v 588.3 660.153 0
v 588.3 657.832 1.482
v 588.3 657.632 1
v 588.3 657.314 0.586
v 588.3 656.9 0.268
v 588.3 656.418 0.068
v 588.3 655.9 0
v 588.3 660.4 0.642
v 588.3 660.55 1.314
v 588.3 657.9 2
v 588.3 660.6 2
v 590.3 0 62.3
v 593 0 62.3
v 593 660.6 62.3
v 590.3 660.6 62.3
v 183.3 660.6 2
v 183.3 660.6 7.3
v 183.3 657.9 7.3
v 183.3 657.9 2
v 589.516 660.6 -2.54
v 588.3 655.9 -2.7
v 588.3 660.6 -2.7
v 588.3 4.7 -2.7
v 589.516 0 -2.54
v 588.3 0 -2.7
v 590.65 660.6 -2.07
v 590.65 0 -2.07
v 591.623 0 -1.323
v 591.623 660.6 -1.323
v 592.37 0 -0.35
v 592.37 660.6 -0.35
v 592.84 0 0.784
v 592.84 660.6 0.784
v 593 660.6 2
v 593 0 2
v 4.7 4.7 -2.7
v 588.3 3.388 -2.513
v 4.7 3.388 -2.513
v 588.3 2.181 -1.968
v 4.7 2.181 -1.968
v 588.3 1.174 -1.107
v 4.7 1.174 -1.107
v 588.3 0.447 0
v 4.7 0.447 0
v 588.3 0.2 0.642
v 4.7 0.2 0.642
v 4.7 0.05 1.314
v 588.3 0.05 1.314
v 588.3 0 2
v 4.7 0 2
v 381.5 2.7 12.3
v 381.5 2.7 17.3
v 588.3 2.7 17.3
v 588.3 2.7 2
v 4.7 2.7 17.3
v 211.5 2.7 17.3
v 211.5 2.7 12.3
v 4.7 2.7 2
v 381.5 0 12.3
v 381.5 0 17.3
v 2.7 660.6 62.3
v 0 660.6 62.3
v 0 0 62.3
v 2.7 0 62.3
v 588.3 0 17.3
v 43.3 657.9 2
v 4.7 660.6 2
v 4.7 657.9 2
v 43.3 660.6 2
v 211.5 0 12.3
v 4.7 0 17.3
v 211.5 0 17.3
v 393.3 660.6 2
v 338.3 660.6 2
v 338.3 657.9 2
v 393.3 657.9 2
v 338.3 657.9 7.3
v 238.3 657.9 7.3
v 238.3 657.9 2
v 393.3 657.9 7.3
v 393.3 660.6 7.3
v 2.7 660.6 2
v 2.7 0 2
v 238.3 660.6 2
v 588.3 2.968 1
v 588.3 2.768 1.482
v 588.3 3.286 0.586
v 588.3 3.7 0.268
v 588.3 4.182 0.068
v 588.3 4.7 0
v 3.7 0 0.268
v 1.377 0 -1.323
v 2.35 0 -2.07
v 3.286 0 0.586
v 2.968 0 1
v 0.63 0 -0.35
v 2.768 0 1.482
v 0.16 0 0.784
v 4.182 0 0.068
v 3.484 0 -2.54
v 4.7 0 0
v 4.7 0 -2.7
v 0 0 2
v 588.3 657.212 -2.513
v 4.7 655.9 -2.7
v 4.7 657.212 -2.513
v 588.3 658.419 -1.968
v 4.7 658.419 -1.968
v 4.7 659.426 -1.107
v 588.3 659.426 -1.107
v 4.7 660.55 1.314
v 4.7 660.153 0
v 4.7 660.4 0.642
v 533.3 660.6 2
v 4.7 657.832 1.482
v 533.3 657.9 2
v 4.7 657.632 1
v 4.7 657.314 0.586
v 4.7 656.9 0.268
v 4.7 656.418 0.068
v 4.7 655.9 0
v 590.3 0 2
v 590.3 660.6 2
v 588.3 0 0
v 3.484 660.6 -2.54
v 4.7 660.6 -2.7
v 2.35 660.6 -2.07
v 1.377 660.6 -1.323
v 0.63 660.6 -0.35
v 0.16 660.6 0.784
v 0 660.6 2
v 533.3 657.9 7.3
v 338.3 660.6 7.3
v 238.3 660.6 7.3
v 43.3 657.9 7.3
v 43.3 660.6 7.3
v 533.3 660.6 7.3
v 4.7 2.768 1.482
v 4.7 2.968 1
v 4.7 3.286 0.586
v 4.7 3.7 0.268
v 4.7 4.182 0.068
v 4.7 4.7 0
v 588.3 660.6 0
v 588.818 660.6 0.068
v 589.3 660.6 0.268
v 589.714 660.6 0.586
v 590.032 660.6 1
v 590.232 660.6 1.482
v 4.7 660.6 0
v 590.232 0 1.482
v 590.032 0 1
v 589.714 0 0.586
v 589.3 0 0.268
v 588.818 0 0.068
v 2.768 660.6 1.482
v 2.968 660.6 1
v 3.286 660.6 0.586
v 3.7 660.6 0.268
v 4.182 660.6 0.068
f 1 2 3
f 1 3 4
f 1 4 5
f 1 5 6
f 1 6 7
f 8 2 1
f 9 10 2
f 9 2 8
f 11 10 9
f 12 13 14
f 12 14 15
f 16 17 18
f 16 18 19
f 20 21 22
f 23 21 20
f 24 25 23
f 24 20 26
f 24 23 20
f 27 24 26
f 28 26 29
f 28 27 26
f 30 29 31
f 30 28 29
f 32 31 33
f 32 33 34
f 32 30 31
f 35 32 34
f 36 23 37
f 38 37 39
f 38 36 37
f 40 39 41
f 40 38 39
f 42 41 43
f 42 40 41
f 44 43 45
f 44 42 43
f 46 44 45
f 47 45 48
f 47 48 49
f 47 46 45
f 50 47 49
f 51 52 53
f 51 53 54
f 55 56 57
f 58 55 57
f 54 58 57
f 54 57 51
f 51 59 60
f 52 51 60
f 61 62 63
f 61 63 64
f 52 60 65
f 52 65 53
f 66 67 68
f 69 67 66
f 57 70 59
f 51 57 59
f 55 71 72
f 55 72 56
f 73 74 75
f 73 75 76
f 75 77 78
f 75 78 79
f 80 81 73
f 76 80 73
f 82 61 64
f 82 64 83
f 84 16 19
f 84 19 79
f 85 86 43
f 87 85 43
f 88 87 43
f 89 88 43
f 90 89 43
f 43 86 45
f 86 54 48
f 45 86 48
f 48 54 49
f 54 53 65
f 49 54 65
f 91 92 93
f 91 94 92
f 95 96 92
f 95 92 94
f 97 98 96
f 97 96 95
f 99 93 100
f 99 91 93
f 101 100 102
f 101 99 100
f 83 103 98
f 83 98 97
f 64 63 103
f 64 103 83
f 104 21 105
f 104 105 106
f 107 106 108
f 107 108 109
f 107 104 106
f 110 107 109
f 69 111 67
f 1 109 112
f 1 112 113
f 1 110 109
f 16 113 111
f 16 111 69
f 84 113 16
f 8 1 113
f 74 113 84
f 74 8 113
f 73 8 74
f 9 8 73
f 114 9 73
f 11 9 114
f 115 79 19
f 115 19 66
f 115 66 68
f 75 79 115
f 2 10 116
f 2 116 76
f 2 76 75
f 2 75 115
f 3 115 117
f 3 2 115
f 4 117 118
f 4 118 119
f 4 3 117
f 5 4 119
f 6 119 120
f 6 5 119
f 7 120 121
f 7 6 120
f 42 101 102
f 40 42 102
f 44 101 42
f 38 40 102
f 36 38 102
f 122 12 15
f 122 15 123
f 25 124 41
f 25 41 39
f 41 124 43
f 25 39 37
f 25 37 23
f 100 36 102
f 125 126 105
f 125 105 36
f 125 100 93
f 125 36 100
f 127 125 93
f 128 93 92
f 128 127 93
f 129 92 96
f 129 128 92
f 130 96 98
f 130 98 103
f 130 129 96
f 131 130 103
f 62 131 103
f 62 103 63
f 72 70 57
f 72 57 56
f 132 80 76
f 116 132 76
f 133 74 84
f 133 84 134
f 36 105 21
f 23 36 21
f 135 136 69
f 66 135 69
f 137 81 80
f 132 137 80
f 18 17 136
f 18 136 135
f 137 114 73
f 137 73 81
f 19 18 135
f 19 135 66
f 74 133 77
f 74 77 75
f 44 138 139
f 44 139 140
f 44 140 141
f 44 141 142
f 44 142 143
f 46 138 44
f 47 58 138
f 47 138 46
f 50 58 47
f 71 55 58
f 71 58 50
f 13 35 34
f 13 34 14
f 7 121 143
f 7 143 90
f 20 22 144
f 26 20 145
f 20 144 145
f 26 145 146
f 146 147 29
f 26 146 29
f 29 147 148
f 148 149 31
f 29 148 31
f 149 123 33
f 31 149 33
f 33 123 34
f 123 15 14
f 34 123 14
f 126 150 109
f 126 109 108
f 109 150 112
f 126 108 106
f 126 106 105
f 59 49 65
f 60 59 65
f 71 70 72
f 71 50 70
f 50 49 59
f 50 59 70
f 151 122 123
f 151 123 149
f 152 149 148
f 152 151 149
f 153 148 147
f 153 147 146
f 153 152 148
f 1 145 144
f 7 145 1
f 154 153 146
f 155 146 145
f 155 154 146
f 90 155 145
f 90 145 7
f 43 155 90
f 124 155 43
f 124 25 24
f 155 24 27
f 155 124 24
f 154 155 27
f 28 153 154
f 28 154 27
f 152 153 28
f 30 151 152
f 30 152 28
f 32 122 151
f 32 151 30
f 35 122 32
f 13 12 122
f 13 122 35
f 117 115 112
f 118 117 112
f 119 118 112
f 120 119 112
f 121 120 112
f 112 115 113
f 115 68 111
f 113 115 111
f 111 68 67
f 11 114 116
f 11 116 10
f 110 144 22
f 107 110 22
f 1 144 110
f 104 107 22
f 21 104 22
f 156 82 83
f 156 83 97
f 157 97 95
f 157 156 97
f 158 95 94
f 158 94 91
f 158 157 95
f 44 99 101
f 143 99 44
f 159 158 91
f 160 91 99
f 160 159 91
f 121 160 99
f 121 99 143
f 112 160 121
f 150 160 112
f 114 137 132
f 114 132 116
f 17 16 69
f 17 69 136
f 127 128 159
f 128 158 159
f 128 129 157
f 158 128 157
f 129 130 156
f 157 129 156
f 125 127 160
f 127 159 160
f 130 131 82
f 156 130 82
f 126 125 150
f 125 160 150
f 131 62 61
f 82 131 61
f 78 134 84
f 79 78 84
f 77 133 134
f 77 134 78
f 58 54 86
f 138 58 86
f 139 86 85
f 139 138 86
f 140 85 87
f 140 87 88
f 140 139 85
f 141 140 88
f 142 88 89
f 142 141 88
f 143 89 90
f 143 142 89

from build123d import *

# Parameters (mm, degrees)
SKETCH1_W                      = 593
SKETCH1_H                      = 660.6
BASE_FLANGE1_DEPTH             = 2.7
EDGE_FLANGE1_STRIP_W           = 14.8
EDGE_FLANGE1_STRIP_H           = 2.7
EDGE_FLANGE1_STRIP_CUT_DEPTH   = 660.6
EDGE_FLANGE1_STRIP_2_W         = 14.8
EDGE_FLANGE1_STRIP_2_H         = 2.7
EDGE_FLANGE1_STRIP_CUT_2_DEPTH = 660.6
EDGE_FLANGE1_DEPTH             = 660.6
EDGE_FLANGE1_BEND_DEPTH        = 660.6
EDGE_FLANGE2_STRIP_W           = 14.8
EDGE_FLANGE2_STRIP_H           = 2.7
EDGE_FLANGE2_STRIP_CUT_DEPTH   = 583.6
EDGE_FLANGE2_DEPTH             = 583.6
CUT_EXTRUDE2_REACH             = 891.9
SKETCH15_W                     = 38.6
SKETCH15_H                     = 5.3
SKETCH15_W_2                   = 55
EDGE_FLANGE3_STRIP_W           = 14.8
EDGE_FLANGE3_STRIP_H           = 2.7
EDGE_FLANGE3_STRIP_CUT_DEPTH   = 583.6
EDGE_FLANGE3_DEPTH             = 583.6
CUT_EXTRUDE3_REACH             = 891.9
SKETCH23_W                     = 170
SKETCH23_H                     = 5


# Sheet-metal steps are written as plain solids
with BuildPart() as part:
    # Sketch1 → Base-Flange1 (new body)
    with BuildSketch(Plane.XY):
        with Locations((296.5, 330.3)):
            Rectangle(SKETCH1_W, SKETCH1_H)
    extrude(amount=-BASE_FLANGE1_DEPTH)

    # Edge-Flange1 strip (across the edge) → Edge-Flange1 strip cut (cut)
    with BuildSketch(Plane.XZ.offset(-660.6)):
        with Locations((-2.7, -1.35)):
            Rectangle(EDGE_FLANGE1_STRIP_W, EDGE_FLANGE1_STRIP_H)
    extrude(amount=EDGE_FLANGE1_STRIP_CUT_DEPTH, mode=Mode.SUBTRACT)

    # Edge-Flange1 strip 2 (across the edge) → Edge-Flange1 strip cut 2 (cut)
    with BuildSketch(Plane(origin=(593, 0, 0), x_dir=(-1, 0, 0), z_dir=(0, 1, 0))):
        with Locations((-2.7, -1.35)):
            Rectangle(EDGE_FLANGE1_STRIP_2_W, EDGE_FLANGE1_STRIP_2_H)
    extrude(amount=EDGE_FLANGE1_STRIP_CUT_2_DEPTH, mode=Mode.SUBTRACT)

    # Edge-Flange1 section (across the edge) → Edge-Flange1 (add)
    with BuildSketch(Plane.XZ.offset(-660.6)):
        with BuildLine():
            Line((0, 2), (0, 62.3))
            Line((0, 62.3), (2.7, 62.3))
            Line((2.7, 62.3), (2.7, 2))
            ThreePointArc((2.7, 2), (3.285786438, 0.585786438), (4.7, 0))
            Line((4.7, 0), (4.7, -2.7))
            ThreePointArc((4.7, -2.7), (1.376598128, -1.323401872), (0, 2))
        make_face()
    extrude(amount=EDGE_FLANGE1_DEPTH)

    # Edge-Flange1 section 2 (across the edge) → Edge-Flange1 bend (add)
    with BuildSketch(Plane(origin=(593, 0, 0), x_dir=(-1, 0, 0), z_dir=(0, 1, 0))):
        with BuildLine():
            Line((0, 2), (0, 62.3))
            Line((0, 62.3), (2.7, 62.3))
            Line((2.7, 62.3), (2.7, 2))
            ThreePointArc((2.7, 2), (3.285786438, 0.585786438), (4.7, 0))
            Line((4.7, 0), (4.7, -2.7))
            ThreePointArc((4.7, -2.7), (1.376598128, -1.323401872), (0, 2))
        make_face()
    extrude(amount=EDGE_FLANGE1_BEND_DEPTH)

    # Edge-Flange2 strip (across the edge) → Edge-Flange2 strip cut (cut)
    with BuildSketch(Plane(origin=(588.3, 660.6, 0), x_dir=(0, -1, 0), z_dir=(-1, 0, 0))):
        with Locations((-2.7, -1.35)):
            Rectangle(EDGE_FLANGE2_STRIP_W, EDGE_FLANGE2_STRIP_H)
    extrude(amount=EDGE_FLANGE2_STRIP_CUT_DEPTH, mode=Mode.SUBTRACT)

    # Edge-Flange2 section (across the edge) → Edge-Flange2 (add)
    with BuildSketch(Plane(origin=(588.3, 660.6, 0), x_dir=(0, -1, 0), z_dir=(-1, 0, 0))):
        with BuildLine():
            Line((0, 2), (0, 7.3))
            Line((0, 7.3), (2.7, 7.3))
            Line((2.7, 7.3), (2.7, 2))
            ThreePointArc((2.7, 2), (3.285786438, 0.585786438), (4.7, 0))
            Line((4.7, 0), (4.7, -2.7))
            ThreePointArc((4.7, -2.7), (1.376598128, -1.323401872), (0, 2))
        make_face()
    extrude(amount=EDGE_FLANGE2_DEPTH)

    # Sketch15 → Cut-Extrude2 (cut, up to next)
    with BuildSketch(Plane(origin=(0, 660.6, 0), x_dir=(1, 0, 0), z_dir=(0, 1, 0)), mode=Mode.PRIVATE) as cut_extrude2_sk1:
        with Locations((24, -4.65)):
            Rectangle(SKETCH15_W, SKETCH15_H)
    cut_extrude2_tool1 = extrude(cut_extrude2_sk1.sketch, amount=-CUT_EXTRUDE2_REACH, mode=Mode.PRIVATE) & part.part
    # Sketch15 → Cut-Extrude2 (cut, up to next)
    with BuildSketch(Plane(origin=(0, 660.6, 0), x_dir=(1, 0, 0), z_dir=(0, 1, 0)), mode=Mode.PRIVATE) as cut_extrude2_sk2:
        with Locations((210.8, -4.65)):
            Rectangle(SKETCH15_W_2, SKETCH15_H)
    cut_extrude2_tool2 = extrude(cut_extrude2_sk2.sketch, amount=-CUT_EXTRUDE2_REACH, mode=Mode.PRIVATE) & part.part
    # Sketch15 → Cut-Extrude2 (cut, up to next)
    with BuildSketch(Plane(origin=(0, 660.6, 0), x_dir=(1, 0, 0), z_dir=(0, 1, 0)), mode=Mode.PRIVATE) as cut_extrude2_sk3:
        with Locations((365.8, -4.65)):
            Rectangle(SKETCH15_W_2, SKETCH15_H)
    cut_extrude2_tool3 = extrude(cut_extrude2_sk3.sketch, amount=-CUT_EXTRUDE2_REACH, mode=Mode.PRIVATE) & part.part
    # Sketch15 → Cut-Extrude2 (cut, up to next)
    with BuildSketch(Plane(origin=(0, 660.6, 0), x_dir=(1, 0, 0), z_dir=(0, 1, 0)), mode=Mode.PRIVATE) as cut_extrude2_sk4:
        with Locations((560.8, -4.65)):
            Rectangle(SKETCH15_W_2, SKETCH15_H)
    cut_extrude2_tool4 = extrude(cut_extrude2_sk4.sketch, amount=-CUT_EXTRUDE2_REACH, mode=Mode.PRIVATE) & part.part
    add(cut_extrude2_tool1.solids().sort_by_distance((24, 660.6, 4.65))[0], mode=Mode.SUBTRACT)
    add(cut_extrude2_tool2.solids().sort_by_distance((210.8, 660.6, 4.65))[0], mode=Mode.SUBTRACT)
    add(cut_extrude2_tool3.solids().sort_by_distance((365.8, 660.6, 4.65))[0], mode=Mode.SUBTRACT)
    add(cut_extrude2_tool4.solids().sort_by_distance((560.8, 660.6, 4.65))[0], mode=Mode.SUBTRACT)

    # Edge-Flange3 strip (across the edge) → Edge-Flange3 strip cut (cut)
    with BuildSketch(Plane.YZ.offset(4.7)):
        with Locations((-2.7, -1.35)):
            Rectangle(EDGE_FLANGE3_STRIP_W, EDGE_FLANGE3_STRIP_H)
    extrude(amount=EDGE_FLANGE3_STRIP_CUT_DEPTH, mode=Mode.SUBTRACT)

    # Edge-Flange3 section (across the edge) → Edge-Flange3 (add)
    with BuildSketch(Plane.YZ.offset(4.7)):
        with BuildLine():
            Line((0, 2), (0, 17.3))
            Line((0, 17.3), (2.7, 17.3))
            Line((2.7, 17.3), (2.7, 2))
            ThreePointArc((2.7, 2), (3.285786438, 0.585786438), (4.7, 0))
            Line((4.7, 0), (4.7, -2.7))
            ThreePointArc((4.7, -2.7), (1.376598128, -1.323401872), (0, 2))
        make_face()
    extrude(amount=EDGE_FLANGE3_DEPTH)

    # Sketch23 → Cut-Extrude3 (cut, up to next)
    with BuildSketch(Plane.XZ, mode=Mode.PRIVATE) as cut_extrude3_sk1:
        with Locations((296.5, 14.8)):
            Rectangle(SKETCH23_W, SKETCH23_H)
    cut_extrude3_tool1 = extrude(cut_extrude3_sk1.sketch, amount=-CUT_EXTRUDE3_REACH, mode=Mode.PRIVATE) & part.part
    add(cut_extrude3_tool1.solids().sort_by_distance((296.5, 0, 14.8))[0], mode=Mode.SUBTRACT)


solid = part.part
